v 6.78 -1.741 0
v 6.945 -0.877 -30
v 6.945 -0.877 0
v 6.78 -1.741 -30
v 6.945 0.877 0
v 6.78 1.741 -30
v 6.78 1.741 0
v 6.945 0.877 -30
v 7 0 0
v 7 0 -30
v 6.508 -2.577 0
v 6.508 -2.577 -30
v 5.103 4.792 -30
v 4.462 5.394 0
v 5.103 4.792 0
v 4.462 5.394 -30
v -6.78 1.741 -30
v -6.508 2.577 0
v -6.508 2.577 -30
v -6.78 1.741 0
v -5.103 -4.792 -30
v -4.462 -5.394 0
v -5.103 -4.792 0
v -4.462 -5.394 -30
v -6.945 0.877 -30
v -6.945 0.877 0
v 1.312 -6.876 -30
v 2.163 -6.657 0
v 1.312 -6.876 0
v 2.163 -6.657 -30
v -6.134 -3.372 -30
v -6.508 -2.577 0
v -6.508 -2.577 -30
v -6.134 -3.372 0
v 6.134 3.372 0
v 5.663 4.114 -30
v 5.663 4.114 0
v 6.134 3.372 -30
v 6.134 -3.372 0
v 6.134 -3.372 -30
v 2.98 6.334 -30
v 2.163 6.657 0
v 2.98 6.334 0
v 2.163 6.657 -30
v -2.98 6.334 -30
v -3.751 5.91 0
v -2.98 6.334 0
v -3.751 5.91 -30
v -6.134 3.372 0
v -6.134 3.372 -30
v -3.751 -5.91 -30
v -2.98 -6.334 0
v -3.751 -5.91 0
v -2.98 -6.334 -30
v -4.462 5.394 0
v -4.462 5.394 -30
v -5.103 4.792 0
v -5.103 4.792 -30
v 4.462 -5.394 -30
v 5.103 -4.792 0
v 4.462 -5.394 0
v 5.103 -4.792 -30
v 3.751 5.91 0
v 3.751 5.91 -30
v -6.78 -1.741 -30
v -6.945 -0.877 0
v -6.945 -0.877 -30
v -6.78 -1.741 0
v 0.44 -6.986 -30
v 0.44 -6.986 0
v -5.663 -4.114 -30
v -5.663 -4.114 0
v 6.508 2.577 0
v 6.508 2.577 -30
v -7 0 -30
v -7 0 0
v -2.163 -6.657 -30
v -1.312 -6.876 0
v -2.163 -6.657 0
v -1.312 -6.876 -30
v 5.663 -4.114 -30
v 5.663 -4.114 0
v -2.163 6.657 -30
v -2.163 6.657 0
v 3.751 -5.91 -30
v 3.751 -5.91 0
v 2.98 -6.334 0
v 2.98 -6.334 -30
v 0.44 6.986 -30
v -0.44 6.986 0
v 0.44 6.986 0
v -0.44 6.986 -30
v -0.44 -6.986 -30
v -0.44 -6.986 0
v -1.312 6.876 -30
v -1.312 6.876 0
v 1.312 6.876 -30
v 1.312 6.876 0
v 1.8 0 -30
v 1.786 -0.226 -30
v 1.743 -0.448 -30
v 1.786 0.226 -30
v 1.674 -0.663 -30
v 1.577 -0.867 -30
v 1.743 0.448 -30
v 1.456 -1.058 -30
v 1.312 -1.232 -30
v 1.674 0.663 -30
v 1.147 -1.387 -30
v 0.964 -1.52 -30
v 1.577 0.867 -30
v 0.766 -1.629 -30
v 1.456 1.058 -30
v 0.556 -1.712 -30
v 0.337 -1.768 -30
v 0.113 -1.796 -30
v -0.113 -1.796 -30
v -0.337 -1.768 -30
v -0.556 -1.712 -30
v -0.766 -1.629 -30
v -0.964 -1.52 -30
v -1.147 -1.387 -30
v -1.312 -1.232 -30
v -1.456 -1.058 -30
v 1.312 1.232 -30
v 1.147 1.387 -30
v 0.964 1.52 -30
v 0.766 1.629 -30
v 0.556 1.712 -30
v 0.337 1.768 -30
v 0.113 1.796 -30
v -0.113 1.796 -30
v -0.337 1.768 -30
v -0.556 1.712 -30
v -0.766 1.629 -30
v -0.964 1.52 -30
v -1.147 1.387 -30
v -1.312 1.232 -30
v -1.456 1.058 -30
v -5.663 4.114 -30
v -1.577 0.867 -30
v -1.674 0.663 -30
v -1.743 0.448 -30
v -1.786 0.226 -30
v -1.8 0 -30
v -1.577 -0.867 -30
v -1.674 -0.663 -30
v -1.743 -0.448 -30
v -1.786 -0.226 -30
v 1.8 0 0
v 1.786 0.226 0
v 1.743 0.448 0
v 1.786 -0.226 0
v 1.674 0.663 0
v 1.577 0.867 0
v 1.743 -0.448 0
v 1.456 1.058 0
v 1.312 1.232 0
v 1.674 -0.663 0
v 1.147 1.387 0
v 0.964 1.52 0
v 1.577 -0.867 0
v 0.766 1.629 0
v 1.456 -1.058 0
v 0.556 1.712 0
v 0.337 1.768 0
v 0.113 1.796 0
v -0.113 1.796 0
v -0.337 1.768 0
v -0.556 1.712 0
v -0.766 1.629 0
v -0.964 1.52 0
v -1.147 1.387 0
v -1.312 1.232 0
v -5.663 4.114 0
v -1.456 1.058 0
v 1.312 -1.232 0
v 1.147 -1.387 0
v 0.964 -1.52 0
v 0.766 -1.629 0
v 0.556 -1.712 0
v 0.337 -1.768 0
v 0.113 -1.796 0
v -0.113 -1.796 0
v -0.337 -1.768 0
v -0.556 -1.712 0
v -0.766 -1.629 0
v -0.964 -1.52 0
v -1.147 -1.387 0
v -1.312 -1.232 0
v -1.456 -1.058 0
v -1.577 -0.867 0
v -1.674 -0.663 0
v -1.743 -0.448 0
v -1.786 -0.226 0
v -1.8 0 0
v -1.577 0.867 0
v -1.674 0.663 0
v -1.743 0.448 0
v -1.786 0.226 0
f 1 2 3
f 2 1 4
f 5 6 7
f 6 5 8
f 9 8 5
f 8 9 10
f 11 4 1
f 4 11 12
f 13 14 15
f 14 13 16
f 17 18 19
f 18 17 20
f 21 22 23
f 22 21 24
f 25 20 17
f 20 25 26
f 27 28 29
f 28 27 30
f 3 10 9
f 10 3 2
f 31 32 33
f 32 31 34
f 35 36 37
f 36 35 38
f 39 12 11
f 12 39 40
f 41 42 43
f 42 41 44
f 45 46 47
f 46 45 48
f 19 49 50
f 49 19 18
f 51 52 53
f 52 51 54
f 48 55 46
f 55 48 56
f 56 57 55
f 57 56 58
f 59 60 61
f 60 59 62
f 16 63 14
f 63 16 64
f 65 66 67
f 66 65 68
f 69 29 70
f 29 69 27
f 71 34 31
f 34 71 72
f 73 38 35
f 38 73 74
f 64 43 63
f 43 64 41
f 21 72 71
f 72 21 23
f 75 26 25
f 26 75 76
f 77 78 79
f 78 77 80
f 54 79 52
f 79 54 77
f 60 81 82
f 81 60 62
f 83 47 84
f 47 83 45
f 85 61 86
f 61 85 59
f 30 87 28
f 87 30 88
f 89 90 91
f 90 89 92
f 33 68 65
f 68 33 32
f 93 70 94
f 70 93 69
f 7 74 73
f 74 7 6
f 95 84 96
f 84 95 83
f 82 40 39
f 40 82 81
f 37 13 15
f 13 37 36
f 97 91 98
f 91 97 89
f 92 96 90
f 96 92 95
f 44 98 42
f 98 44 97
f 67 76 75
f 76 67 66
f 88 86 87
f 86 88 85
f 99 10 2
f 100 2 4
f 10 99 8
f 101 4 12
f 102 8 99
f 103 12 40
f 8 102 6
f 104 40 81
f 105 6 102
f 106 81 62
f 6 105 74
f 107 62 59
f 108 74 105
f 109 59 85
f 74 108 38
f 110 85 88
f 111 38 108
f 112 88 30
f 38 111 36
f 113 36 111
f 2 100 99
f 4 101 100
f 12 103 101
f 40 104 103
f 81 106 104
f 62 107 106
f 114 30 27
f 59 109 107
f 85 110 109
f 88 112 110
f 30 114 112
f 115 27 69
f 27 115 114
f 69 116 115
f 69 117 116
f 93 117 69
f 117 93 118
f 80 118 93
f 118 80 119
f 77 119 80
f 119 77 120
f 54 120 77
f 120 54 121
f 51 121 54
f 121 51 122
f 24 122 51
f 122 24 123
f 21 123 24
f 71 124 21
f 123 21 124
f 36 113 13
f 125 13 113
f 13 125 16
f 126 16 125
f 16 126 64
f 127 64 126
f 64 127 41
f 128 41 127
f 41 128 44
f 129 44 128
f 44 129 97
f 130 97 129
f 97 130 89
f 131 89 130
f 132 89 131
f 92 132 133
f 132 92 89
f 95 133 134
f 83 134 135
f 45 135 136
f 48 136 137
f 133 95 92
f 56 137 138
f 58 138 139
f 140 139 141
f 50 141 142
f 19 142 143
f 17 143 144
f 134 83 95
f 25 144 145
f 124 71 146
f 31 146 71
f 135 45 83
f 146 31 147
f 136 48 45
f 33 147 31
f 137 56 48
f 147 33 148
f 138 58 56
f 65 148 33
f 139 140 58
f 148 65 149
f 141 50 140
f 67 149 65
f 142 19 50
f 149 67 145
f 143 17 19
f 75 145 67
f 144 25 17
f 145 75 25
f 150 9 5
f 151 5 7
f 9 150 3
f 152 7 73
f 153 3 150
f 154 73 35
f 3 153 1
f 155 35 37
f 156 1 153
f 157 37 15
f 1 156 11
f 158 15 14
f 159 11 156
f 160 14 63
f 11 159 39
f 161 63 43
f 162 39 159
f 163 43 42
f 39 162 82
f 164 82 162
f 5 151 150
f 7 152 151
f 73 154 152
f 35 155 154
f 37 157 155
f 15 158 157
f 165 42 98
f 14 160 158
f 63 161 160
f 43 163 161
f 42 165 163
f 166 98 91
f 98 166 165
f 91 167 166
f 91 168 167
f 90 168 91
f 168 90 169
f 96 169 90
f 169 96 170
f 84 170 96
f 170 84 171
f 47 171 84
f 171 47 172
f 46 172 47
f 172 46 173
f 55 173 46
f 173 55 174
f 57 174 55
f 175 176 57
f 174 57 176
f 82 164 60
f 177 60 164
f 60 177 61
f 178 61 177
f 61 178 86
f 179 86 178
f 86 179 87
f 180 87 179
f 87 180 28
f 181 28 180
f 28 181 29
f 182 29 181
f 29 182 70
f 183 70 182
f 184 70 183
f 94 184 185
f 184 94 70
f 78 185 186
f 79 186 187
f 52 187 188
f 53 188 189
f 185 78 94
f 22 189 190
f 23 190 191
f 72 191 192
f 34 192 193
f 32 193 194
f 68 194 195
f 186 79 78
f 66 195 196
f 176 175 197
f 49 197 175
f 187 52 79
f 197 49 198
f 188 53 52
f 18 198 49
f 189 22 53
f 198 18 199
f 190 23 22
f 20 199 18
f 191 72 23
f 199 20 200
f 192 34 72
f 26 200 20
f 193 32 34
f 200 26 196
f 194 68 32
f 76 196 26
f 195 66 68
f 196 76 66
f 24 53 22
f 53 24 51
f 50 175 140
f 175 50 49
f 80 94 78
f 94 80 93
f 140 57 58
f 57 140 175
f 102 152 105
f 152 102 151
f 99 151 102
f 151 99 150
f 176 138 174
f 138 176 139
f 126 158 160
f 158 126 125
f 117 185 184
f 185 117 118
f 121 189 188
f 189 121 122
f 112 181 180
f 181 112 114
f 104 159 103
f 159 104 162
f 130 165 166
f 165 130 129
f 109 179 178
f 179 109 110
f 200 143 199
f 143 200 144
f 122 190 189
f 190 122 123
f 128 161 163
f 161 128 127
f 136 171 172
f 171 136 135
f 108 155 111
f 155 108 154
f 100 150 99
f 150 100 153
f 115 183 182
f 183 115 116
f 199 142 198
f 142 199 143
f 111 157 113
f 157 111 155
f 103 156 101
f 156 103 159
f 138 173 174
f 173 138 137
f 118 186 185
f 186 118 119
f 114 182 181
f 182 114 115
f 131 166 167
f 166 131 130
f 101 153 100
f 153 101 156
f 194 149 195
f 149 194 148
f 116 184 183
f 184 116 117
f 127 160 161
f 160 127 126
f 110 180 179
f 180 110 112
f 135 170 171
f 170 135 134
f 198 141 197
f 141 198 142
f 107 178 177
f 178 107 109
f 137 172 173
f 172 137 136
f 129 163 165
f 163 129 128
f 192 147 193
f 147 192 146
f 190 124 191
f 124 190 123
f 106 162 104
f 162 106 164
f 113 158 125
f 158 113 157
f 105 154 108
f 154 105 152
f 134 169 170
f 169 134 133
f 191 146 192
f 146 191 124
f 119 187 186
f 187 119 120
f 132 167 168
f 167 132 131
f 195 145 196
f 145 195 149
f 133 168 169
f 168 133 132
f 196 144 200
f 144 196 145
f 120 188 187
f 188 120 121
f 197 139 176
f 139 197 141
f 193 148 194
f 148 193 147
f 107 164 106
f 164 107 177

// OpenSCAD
$fn = 50;


difference() {
	union() {
		translate(v = [0, 0, -30.0000000000]) {
			cylinder(h = 30, r = 7.0000000000);
		}
		cylinder(h = 0, r = 16.0000000000);
	}
	union() {
		#translate(v = [0, 0, -30]) {
			cylinder(h = 30, r = 1.8000000000);
		}
	}
}
